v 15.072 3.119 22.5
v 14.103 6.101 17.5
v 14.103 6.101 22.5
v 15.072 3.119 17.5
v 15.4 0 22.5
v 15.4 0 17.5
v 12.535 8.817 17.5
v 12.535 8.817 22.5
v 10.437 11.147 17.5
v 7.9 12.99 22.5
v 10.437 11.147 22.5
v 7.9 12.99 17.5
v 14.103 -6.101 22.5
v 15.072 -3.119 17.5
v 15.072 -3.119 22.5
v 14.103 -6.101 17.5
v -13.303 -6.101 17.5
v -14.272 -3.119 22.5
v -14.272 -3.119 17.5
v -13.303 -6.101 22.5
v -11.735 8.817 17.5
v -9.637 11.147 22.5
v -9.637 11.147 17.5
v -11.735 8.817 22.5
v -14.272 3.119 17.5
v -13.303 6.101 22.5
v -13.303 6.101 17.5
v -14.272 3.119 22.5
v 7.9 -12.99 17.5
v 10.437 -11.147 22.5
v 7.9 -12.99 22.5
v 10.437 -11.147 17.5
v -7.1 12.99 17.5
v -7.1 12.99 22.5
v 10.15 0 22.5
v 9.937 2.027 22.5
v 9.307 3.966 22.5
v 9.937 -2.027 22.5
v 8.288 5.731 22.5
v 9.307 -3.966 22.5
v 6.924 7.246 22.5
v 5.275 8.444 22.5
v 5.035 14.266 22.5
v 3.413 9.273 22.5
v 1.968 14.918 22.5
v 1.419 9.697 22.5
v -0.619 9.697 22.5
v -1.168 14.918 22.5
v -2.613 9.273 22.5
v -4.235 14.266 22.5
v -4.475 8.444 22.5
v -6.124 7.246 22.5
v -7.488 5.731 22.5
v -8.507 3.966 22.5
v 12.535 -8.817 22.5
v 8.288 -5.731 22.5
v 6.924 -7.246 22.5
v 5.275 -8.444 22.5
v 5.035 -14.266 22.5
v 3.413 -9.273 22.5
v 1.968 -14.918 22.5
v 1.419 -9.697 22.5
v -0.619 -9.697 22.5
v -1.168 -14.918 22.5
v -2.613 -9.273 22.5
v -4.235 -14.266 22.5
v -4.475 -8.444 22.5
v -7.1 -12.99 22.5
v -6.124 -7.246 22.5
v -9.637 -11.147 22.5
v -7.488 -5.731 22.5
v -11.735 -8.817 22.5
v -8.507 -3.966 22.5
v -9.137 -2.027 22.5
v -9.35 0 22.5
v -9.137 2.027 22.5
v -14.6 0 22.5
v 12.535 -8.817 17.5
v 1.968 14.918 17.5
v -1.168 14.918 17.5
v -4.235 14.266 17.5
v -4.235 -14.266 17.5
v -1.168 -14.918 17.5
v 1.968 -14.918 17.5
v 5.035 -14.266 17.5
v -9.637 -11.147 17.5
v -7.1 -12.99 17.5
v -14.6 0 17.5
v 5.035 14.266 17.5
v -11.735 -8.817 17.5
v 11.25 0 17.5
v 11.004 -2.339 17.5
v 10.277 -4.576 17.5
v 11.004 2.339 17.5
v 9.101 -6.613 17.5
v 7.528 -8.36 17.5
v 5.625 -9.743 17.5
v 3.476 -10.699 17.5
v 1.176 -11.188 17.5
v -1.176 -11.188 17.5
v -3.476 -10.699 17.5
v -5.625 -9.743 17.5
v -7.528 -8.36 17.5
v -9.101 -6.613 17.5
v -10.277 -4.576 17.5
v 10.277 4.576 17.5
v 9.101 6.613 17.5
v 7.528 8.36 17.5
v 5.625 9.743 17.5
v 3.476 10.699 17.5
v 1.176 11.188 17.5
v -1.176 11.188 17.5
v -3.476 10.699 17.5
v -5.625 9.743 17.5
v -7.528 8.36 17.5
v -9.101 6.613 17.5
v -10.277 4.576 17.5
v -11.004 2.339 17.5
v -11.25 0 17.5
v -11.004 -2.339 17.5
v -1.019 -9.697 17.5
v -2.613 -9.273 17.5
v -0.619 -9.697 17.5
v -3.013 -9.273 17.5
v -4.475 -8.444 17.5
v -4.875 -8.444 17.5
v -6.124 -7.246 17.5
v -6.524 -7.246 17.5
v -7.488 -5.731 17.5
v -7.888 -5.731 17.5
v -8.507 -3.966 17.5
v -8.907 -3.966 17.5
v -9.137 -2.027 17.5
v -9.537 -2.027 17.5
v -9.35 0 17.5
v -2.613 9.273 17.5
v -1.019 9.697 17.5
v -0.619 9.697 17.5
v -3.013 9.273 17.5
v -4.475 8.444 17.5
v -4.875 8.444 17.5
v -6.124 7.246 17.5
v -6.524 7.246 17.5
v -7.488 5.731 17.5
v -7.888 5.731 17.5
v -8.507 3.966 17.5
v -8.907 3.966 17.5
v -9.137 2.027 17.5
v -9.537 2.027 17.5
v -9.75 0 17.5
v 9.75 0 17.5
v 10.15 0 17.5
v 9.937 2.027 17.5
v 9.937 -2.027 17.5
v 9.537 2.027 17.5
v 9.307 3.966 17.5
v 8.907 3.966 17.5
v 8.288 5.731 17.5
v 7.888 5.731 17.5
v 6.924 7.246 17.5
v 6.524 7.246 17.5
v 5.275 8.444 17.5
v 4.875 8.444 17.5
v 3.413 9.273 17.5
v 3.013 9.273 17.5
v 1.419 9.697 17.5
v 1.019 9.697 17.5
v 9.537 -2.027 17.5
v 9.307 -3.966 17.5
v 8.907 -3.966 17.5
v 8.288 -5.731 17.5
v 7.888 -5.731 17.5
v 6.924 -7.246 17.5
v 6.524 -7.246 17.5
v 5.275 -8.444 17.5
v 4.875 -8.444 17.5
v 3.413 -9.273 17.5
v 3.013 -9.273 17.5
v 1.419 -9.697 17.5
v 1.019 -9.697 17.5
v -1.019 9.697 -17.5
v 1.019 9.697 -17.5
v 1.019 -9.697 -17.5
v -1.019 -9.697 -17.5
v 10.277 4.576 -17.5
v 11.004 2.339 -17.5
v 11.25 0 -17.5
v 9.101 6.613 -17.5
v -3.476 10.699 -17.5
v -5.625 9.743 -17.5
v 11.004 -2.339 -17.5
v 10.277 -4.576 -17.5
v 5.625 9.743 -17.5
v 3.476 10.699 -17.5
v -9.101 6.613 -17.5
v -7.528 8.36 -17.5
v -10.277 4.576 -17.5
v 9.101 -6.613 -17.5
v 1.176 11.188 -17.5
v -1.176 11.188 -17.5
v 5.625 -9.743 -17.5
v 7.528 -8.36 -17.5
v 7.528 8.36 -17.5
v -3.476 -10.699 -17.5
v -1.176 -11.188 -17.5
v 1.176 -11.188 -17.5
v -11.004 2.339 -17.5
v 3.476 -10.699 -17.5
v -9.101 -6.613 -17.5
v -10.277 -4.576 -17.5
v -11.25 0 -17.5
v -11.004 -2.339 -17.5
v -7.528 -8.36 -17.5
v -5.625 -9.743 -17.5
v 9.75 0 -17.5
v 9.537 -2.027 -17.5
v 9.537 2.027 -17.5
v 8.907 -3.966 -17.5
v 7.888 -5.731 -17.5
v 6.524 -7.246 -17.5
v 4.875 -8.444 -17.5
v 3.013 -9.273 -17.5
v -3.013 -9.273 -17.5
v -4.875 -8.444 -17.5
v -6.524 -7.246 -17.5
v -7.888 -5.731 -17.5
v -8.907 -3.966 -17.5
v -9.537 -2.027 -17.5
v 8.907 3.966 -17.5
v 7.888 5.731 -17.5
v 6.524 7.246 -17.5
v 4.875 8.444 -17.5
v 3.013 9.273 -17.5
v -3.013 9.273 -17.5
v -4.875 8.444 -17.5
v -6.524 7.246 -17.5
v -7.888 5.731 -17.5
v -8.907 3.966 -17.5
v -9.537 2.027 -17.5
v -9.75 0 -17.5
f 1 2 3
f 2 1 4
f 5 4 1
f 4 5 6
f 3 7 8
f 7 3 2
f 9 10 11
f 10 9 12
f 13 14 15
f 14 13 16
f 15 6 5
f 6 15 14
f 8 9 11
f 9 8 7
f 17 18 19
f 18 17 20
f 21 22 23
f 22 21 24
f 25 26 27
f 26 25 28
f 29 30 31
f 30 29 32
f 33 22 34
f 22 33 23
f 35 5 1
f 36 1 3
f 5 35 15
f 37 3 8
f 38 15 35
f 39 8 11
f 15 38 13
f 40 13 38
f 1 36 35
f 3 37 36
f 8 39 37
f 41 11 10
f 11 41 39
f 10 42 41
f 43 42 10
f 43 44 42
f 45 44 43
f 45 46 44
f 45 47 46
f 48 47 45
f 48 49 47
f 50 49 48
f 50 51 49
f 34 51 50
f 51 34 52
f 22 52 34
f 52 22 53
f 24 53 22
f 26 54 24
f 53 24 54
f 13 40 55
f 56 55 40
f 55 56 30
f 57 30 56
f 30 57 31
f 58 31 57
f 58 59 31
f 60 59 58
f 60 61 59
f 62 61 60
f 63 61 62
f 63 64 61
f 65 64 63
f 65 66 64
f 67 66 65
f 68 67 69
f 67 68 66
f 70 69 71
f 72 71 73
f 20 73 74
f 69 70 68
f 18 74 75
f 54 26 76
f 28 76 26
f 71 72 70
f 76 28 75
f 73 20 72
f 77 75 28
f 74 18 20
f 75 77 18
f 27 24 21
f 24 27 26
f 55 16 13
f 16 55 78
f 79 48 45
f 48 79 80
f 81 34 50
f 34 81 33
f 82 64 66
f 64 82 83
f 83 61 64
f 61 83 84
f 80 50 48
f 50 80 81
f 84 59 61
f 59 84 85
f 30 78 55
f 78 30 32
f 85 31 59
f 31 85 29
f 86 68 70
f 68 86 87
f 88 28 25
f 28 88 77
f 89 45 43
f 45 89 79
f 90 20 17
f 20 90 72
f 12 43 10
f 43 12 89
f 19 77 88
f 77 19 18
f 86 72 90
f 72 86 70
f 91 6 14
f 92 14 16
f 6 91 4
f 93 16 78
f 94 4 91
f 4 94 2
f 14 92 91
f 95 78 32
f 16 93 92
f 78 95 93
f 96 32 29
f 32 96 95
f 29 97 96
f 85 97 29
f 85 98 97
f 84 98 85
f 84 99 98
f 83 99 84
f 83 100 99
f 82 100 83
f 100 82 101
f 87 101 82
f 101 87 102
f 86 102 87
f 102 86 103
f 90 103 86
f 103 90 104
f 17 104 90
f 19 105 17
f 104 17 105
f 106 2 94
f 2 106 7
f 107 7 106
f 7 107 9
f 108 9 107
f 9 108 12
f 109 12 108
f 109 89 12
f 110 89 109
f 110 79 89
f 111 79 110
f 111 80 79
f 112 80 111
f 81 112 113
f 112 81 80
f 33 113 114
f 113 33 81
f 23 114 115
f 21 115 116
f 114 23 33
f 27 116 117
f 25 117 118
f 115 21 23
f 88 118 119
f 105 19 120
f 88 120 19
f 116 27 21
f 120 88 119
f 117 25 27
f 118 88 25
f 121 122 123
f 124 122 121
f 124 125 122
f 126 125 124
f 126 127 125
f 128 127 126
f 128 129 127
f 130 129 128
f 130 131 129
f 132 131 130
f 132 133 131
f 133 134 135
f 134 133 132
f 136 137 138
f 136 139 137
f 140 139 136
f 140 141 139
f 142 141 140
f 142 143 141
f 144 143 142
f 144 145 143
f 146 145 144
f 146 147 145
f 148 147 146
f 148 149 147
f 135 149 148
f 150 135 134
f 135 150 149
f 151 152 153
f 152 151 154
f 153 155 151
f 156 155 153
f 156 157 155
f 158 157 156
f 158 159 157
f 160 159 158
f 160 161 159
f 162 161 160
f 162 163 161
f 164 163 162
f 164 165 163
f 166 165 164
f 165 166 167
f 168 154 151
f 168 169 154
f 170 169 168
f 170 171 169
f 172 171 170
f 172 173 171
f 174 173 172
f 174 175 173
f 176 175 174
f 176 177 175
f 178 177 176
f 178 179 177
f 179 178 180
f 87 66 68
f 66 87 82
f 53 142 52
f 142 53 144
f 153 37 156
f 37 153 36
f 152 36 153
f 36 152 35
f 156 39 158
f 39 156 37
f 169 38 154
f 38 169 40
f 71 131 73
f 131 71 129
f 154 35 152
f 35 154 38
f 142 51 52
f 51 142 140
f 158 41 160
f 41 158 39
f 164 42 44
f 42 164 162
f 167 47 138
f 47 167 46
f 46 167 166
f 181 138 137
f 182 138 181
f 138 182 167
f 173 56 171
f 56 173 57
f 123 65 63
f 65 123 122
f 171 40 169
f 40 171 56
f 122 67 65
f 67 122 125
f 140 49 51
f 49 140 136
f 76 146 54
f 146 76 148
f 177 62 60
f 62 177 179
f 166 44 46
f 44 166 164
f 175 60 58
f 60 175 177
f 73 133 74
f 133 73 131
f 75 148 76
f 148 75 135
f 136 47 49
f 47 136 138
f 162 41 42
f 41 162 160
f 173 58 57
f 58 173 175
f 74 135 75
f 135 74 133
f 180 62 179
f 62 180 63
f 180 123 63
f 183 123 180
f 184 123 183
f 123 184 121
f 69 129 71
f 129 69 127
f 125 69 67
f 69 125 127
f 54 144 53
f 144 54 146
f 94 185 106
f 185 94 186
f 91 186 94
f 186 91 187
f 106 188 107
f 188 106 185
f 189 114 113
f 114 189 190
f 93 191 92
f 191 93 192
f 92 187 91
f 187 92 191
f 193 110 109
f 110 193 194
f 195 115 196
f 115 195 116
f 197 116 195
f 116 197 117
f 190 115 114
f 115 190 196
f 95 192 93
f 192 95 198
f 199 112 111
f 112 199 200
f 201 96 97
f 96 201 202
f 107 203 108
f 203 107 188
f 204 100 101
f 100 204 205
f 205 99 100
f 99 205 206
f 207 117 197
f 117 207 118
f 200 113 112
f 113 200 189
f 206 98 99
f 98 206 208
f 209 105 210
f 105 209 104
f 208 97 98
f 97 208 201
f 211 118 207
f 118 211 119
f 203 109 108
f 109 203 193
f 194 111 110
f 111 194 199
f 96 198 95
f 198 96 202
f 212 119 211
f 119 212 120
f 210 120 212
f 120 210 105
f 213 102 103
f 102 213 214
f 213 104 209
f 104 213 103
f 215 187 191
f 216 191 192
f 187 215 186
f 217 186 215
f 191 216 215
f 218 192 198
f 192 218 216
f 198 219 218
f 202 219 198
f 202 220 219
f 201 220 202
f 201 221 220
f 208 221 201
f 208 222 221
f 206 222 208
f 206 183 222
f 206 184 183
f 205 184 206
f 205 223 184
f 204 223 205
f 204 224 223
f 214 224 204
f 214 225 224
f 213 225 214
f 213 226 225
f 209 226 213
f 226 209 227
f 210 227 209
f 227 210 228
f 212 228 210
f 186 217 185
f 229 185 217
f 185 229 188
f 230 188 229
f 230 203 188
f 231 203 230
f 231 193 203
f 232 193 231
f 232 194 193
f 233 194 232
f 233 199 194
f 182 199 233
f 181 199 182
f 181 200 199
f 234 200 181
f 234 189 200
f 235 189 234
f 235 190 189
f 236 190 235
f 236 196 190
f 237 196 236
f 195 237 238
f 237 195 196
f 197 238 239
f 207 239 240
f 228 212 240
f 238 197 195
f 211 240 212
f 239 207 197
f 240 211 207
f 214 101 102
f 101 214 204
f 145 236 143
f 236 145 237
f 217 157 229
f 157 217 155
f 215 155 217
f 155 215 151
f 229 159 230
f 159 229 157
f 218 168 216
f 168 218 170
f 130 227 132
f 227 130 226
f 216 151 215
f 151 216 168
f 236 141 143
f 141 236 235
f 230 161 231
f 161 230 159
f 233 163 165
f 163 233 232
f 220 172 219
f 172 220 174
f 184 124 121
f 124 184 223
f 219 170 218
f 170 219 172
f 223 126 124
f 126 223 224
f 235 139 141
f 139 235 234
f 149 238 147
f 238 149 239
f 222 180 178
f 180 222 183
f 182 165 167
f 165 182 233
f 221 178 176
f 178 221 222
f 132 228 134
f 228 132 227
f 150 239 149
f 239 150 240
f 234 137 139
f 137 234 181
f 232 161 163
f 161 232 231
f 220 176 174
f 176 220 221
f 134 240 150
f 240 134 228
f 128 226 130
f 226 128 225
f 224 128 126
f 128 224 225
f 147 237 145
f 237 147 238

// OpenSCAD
// ocular.scad — окуляр
ocular();
module top(){
    difference(){
        cylinder(d = 30, h = 5, center = true);
        cylinder(d = 23 - 0.5 - 3, h = 15, center = true);
    }
}

module ocular(){
    translate([0.4, 0, 35/2 + 5/2])
    top();
    difference(){
        cylinder(d = 23 - 0.5, h = 35, center = true);
        cylinder(d = 23 - 0.5 - 3, h = 40, center = true);
    }
}

// === Автономный запуск ===
// ocular();
